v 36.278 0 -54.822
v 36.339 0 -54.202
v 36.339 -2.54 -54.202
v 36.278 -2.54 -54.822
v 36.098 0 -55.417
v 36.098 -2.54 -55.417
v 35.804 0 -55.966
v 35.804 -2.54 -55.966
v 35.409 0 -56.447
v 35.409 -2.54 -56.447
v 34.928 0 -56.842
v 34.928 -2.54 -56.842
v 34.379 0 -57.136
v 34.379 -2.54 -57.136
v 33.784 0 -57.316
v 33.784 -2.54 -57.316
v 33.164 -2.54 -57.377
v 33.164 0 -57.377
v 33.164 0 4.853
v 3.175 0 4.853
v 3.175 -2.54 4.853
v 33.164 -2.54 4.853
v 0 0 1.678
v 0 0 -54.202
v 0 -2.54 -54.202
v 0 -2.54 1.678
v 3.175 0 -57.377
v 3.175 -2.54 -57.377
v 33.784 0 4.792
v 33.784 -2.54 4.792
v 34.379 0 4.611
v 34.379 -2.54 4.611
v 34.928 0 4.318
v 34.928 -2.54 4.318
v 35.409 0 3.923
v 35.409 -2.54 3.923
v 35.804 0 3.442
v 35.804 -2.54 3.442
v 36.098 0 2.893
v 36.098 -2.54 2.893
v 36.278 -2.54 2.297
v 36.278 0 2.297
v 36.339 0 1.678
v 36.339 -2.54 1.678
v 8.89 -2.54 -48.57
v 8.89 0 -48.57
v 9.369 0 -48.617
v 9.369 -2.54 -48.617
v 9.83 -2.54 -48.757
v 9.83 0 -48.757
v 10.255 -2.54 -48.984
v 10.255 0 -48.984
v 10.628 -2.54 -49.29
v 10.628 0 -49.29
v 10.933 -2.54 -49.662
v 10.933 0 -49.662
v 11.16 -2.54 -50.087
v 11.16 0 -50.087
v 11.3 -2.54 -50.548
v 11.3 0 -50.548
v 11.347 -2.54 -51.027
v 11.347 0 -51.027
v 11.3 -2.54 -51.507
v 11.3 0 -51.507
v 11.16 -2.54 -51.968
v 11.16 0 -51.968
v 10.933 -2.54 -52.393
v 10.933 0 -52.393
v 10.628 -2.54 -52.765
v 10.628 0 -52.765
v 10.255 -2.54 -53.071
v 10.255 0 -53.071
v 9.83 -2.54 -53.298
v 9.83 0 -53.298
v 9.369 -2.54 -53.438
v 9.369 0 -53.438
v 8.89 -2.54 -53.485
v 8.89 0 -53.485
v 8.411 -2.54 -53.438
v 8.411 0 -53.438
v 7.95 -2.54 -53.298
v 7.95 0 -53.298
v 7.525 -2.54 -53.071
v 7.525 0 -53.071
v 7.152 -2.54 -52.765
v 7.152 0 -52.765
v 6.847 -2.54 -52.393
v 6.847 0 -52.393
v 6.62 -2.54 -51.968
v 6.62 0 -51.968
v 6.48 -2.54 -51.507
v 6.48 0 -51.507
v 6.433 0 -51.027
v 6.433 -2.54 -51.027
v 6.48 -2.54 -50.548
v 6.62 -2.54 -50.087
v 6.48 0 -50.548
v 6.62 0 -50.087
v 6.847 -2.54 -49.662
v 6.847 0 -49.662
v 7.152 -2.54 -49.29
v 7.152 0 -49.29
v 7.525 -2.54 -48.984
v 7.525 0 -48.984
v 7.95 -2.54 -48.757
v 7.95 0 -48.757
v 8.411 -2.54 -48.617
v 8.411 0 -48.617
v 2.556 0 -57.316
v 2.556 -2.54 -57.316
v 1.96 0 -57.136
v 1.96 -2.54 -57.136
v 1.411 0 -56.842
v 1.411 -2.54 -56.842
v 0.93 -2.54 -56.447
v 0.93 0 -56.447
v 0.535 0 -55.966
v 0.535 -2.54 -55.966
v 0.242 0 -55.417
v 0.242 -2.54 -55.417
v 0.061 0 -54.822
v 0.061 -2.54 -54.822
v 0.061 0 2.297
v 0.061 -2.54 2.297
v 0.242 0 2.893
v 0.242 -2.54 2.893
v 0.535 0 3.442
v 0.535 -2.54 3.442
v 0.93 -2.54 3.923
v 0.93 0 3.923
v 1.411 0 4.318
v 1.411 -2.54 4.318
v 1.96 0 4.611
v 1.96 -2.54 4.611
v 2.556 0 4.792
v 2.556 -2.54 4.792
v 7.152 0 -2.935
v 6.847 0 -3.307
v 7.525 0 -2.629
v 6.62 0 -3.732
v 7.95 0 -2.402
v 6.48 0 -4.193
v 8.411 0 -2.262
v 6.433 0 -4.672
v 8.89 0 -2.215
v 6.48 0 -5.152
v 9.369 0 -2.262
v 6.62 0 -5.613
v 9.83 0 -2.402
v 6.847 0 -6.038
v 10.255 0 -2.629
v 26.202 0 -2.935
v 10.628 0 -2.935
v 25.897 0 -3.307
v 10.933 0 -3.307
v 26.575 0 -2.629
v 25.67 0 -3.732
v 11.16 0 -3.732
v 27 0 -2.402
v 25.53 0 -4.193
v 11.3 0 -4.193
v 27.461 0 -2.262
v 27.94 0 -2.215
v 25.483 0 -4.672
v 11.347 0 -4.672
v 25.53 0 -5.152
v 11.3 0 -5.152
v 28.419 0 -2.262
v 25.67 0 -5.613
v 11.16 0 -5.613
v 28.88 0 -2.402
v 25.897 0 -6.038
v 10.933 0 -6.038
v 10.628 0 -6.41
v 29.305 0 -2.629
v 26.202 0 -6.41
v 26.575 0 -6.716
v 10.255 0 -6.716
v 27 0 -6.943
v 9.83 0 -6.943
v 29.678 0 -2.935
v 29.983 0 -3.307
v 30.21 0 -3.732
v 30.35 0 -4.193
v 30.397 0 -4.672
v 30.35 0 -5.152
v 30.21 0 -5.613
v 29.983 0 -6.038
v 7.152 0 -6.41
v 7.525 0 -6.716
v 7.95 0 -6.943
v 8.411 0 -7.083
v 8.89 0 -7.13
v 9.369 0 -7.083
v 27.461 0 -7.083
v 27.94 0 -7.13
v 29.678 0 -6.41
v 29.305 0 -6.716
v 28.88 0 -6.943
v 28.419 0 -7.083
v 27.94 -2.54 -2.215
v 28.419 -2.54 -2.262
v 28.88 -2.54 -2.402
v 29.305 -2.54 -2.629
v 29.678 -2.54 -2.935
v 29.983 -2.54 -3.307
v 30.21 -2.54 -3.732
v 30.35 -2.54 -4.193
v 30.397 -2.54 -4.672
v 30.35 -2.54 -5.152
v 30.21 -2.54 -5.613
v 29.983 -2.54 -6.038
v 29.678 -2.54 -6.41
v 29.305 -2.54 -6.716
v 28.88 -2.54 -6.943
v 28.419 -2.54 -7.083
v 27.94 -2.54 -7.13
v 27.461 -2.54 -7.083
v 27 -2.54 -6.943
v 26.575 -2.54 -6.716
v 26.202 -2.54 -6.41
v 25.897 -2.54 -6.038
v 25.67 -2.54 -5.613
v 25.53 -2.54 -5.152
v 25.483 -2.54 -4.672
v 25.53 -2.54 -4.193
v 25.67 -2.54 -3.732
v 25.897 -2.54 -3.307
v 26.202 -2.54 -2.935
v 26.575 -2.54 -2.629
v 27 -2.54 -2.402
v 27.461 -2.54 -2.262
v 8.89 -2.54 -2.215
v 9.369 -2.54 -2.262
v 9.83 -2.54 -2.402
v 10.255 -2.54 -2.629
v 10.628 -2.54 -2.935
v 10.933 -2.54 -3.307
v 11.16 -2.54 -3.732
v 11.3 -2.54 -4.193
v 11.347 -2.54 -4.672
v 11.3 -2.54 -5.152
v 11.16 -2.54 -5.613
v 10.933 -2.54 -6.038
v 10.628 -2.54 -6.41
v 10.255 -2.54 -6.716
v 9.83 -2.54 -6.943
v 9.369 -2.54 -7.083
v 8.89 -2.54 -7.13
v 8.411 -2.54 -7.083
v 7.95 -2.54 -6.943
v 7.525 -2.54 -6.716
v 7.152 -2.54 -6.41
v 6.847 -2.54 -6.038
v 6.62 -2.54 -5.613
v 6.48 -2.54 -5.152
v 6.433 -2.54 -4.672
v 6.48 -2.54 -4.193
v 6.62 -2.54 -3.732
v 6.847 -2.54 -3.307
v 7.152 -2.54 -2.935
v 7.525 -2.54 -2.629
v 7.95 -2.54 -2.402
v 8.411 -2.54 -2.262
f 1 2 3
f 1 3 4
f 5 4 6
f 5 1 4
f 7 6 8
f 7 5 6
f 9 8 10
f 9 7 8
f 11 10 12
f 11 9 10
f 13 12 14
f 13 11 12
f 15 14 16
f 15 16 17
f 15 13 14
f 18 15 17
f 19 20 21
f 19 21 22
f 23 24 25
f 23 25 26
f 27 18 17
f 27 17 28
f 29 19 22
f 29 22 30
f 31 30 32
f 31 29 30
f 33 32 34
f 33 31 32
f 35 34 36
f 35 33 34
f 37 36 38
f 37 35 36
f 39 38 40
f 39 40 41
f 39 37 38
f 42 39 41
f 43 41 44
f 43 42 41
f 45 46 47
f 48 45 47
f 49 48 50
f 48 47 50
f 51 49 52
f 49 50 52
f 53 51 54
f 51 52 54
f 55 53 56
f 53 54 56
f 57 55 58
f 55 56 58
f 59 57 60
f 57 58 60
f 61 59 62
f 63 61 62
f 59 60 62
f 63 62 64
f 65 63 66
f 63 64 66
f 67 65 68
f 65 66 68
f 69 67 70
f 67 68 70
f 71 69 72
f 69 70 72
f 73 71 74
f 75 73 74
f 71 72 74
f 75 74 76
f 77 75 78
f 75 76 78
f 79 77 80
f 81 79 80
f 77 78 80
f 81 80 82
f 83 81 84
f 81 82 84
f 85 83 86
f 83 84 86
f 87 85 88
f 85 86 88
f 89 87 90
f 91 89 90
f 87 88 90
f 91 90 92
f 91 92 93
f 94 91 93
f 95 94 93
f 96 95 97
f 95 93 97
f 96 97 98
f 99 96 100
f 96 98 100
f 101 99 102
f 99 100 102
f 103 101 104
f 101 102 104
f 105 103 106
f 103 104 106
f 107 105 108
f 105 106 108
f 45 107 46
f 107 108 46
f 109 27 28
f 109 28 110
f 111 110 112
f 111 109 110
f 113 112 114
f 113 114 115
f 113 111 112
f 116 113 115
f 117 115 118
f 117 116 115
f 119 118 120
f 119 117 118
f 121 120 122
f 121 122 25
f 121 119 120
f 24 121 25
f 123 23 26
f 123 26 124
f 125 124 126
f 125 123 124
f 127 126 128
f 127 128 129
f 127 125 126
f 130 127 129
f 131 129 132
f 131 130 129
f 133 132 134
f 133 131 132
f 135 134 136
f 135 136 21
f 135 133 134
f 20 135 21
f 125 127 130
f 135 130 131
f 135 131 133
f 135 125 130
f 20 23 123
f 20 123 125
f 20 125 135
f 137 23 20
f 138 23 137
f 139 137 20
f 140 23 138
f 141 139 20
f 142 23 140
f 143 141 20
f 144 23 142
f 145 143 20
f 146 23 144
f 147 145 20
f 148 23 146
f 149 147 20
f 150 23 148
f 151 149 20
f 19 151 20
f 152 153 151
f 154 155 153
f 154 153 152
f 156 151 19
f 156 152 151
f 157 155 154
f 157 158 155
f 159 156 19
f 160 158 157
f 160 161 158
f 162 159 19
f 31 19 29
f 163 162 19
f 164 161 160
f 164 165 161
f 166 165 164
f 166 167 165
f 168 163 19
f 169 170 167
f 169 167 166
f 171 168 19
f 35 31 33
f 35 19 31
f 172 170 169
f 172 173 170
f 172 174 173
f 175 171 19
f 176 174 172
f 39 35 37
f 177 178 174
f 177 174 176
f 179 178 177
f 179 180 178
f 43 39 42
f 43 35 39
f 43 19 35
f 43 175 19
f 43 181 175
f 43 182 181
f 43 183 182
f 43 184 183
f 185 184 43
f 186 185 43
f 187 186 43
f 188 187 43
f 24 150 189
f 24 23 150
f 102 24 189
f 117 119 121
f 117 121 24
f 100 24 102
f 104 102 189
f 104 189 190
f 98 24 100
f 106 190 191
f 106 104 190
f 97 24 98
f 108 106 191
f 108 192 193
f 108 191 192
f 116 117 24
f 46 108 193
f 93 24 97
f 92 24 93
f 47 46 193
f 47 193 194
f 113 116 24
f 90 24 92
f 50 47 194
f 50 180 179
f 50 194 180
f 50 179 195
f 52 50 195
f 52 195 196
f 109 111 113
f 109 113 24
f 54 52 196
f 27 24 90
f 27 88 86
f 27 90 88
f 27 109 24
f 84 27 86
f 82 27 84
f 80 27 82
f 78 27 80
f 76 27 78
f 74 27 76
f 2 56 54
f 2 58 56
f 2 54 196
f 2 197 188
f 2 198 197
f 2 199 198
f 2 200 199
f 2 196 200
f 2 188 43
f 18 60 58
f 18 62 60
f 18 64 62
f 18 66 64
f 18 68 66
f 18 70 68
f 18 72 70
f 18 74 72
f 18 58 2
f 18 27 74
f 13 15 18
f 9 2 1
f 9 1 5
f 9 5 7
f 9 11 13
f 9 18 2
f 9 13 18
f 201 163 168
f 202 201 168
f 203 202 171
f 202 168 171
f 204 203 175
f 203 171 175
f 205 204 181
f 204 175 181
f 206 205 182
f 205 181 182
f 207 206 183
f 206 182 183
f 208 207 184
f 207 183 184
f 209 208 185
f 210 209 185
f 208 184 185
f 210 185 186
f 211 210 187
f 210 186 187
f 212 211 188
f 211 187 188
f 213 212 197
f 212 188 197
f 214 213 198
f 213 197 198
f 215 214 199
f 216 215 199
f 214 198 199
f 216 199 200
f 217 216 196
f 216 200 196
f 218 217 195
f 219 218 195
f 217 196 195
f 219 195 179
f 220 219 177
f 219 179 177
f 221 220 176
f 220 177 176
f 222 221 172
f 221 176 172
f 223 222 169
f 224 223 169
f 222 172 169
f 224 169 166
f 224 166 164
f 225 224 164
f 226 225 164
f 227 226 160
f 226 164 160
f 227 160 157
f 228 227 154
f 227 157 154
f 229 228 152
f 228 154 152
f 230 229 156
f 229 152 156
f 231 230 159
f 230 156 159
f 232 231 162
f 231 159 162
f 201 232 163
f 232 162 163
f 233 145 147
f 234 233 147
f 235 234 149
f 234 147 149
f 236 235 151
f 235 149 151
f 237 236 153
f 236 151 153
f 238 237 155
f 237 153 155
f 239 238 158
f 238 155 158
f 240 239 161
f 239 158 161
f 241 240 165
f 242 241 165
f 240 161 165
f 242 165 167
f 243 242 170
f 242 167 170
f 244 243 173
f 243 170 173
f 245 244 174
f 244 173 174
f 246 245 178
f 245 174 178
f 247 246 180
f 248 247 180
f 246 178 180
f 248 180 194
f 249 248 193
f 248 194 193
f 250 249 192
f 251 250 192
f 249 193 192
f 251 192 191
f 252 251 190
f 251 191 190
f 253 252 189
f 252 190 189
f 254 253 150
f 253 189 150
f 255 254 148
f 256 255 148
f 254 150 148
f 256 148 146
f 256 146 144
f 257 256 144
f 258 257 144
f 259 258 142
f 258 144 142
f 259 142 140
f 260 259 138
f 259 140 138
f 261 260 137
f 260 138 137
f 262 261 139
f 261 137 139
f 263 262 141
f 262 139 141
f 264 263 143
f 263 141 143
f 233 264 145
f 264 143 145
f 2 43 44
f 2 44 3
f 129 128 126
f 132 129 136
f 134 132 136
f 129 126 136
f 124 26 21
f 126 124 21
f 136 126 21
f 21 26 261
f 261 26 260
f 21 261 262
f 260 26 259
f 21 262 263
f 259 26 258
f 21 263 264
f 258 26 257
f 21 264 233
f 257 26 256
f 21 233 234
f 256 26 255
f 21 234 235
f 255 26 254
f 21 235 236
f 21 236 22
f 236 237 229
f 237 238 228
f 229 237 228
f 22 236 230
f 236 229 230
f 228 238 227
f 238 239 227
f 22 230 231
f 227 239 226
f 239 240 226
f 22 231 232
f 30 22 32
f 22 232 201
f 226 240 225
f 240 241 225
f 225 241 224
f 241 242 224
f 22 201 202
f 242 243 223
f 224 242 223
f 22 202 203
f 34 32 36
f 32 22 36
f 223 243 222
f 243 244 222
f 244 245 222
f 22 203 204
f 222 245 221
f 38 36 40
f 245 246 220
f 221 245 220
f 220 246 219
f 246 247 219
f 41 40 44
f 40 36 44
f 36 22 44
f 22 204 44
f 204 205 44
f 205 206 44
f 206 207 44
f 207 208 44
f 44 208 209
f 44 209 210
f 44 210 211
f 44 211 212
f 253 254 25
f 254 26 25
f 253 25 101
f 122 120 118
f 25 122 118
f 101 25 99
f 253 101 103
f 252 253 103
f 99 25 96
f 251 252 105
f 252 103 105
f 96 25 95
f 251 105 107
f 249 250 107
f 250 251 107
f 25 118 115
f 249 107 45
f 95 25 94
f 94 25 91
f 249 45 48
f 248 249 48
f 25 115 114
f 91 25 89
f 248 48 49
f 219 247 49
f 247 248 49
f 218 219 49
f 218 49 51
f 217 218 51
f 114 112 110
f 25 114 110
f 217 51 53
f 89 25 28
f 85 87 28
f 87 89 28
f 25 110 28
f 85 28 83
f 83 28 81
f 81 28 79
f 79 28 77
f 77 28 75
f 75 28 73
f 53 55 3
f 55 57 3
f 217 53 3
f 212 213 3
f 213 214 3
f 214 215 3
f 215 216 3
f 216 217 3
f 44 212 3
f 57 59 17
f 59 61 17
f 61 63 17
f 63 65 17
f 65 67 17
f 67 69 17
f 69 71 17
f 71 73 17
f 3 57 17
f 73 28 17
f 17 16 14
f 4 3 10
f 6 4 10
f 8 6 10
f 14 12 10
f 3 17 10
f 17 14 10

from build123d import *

# Parameters (mm, degrees)
SKETCH1_R           = 2.45745
BOSS_EXTRUDE1_DEPTH = 2.54


with BuildPart() as part:
    # Sketch1 → Boss-Extrude1 (new body)
    with BuildSketch(Plane(origin=(0, 0, 0), x_dir=(1, 0, 0), z_dir=(0, 1, 0))):
        with BuildLine():
            Line((3.175, -4.852667781), (33.16436, -4.852667781))
            ThreePointArc((33.16436, -4.852667781), (35.40942403, -3.922731811), (36.33936, -1.677667781))
            Line((36.33936, -1.677667781), (36.33936, 54.202332219))
            ThreePointArc((36.33936, 54.202332219), (35.40942403, 56.447396249), (33.16436, 57.377332219))
            Line((33.16436, 57.377332219), (3.175, 57.377332219))
            ThreePointArc((3.175, 57.377332219), (0.92993597, 56.447396249), (0, 54.202332219))
            Line((0, 54.202332219), (0, -1.677667781))
            ThreePointArc((0, -1.677667781), (0.92993597, -3.922731811), (3.175, -4.852667781))
        make_face()
        with Locations(Location((8.89, 51.027332219, 0), (0, 0, 270))):
            Circle(SKETCH1_R, mode=Mode.SUBTRACT)
        with Locations(Location((27.94, 4.672332219, 0), (0, 0, 270))):
            Circle(SKETCH1_R, mode=Mode.SUBTRACT)
        with Locations(Location((8.89, 4.672332219, 0), (0, 0, 270))):
            Circle(SKETCH1_R, mode=Mode.SUBTRACT)
    extrude(amount=-BOSS_EXTRUDE1_DEPTH)


solid = part.part
